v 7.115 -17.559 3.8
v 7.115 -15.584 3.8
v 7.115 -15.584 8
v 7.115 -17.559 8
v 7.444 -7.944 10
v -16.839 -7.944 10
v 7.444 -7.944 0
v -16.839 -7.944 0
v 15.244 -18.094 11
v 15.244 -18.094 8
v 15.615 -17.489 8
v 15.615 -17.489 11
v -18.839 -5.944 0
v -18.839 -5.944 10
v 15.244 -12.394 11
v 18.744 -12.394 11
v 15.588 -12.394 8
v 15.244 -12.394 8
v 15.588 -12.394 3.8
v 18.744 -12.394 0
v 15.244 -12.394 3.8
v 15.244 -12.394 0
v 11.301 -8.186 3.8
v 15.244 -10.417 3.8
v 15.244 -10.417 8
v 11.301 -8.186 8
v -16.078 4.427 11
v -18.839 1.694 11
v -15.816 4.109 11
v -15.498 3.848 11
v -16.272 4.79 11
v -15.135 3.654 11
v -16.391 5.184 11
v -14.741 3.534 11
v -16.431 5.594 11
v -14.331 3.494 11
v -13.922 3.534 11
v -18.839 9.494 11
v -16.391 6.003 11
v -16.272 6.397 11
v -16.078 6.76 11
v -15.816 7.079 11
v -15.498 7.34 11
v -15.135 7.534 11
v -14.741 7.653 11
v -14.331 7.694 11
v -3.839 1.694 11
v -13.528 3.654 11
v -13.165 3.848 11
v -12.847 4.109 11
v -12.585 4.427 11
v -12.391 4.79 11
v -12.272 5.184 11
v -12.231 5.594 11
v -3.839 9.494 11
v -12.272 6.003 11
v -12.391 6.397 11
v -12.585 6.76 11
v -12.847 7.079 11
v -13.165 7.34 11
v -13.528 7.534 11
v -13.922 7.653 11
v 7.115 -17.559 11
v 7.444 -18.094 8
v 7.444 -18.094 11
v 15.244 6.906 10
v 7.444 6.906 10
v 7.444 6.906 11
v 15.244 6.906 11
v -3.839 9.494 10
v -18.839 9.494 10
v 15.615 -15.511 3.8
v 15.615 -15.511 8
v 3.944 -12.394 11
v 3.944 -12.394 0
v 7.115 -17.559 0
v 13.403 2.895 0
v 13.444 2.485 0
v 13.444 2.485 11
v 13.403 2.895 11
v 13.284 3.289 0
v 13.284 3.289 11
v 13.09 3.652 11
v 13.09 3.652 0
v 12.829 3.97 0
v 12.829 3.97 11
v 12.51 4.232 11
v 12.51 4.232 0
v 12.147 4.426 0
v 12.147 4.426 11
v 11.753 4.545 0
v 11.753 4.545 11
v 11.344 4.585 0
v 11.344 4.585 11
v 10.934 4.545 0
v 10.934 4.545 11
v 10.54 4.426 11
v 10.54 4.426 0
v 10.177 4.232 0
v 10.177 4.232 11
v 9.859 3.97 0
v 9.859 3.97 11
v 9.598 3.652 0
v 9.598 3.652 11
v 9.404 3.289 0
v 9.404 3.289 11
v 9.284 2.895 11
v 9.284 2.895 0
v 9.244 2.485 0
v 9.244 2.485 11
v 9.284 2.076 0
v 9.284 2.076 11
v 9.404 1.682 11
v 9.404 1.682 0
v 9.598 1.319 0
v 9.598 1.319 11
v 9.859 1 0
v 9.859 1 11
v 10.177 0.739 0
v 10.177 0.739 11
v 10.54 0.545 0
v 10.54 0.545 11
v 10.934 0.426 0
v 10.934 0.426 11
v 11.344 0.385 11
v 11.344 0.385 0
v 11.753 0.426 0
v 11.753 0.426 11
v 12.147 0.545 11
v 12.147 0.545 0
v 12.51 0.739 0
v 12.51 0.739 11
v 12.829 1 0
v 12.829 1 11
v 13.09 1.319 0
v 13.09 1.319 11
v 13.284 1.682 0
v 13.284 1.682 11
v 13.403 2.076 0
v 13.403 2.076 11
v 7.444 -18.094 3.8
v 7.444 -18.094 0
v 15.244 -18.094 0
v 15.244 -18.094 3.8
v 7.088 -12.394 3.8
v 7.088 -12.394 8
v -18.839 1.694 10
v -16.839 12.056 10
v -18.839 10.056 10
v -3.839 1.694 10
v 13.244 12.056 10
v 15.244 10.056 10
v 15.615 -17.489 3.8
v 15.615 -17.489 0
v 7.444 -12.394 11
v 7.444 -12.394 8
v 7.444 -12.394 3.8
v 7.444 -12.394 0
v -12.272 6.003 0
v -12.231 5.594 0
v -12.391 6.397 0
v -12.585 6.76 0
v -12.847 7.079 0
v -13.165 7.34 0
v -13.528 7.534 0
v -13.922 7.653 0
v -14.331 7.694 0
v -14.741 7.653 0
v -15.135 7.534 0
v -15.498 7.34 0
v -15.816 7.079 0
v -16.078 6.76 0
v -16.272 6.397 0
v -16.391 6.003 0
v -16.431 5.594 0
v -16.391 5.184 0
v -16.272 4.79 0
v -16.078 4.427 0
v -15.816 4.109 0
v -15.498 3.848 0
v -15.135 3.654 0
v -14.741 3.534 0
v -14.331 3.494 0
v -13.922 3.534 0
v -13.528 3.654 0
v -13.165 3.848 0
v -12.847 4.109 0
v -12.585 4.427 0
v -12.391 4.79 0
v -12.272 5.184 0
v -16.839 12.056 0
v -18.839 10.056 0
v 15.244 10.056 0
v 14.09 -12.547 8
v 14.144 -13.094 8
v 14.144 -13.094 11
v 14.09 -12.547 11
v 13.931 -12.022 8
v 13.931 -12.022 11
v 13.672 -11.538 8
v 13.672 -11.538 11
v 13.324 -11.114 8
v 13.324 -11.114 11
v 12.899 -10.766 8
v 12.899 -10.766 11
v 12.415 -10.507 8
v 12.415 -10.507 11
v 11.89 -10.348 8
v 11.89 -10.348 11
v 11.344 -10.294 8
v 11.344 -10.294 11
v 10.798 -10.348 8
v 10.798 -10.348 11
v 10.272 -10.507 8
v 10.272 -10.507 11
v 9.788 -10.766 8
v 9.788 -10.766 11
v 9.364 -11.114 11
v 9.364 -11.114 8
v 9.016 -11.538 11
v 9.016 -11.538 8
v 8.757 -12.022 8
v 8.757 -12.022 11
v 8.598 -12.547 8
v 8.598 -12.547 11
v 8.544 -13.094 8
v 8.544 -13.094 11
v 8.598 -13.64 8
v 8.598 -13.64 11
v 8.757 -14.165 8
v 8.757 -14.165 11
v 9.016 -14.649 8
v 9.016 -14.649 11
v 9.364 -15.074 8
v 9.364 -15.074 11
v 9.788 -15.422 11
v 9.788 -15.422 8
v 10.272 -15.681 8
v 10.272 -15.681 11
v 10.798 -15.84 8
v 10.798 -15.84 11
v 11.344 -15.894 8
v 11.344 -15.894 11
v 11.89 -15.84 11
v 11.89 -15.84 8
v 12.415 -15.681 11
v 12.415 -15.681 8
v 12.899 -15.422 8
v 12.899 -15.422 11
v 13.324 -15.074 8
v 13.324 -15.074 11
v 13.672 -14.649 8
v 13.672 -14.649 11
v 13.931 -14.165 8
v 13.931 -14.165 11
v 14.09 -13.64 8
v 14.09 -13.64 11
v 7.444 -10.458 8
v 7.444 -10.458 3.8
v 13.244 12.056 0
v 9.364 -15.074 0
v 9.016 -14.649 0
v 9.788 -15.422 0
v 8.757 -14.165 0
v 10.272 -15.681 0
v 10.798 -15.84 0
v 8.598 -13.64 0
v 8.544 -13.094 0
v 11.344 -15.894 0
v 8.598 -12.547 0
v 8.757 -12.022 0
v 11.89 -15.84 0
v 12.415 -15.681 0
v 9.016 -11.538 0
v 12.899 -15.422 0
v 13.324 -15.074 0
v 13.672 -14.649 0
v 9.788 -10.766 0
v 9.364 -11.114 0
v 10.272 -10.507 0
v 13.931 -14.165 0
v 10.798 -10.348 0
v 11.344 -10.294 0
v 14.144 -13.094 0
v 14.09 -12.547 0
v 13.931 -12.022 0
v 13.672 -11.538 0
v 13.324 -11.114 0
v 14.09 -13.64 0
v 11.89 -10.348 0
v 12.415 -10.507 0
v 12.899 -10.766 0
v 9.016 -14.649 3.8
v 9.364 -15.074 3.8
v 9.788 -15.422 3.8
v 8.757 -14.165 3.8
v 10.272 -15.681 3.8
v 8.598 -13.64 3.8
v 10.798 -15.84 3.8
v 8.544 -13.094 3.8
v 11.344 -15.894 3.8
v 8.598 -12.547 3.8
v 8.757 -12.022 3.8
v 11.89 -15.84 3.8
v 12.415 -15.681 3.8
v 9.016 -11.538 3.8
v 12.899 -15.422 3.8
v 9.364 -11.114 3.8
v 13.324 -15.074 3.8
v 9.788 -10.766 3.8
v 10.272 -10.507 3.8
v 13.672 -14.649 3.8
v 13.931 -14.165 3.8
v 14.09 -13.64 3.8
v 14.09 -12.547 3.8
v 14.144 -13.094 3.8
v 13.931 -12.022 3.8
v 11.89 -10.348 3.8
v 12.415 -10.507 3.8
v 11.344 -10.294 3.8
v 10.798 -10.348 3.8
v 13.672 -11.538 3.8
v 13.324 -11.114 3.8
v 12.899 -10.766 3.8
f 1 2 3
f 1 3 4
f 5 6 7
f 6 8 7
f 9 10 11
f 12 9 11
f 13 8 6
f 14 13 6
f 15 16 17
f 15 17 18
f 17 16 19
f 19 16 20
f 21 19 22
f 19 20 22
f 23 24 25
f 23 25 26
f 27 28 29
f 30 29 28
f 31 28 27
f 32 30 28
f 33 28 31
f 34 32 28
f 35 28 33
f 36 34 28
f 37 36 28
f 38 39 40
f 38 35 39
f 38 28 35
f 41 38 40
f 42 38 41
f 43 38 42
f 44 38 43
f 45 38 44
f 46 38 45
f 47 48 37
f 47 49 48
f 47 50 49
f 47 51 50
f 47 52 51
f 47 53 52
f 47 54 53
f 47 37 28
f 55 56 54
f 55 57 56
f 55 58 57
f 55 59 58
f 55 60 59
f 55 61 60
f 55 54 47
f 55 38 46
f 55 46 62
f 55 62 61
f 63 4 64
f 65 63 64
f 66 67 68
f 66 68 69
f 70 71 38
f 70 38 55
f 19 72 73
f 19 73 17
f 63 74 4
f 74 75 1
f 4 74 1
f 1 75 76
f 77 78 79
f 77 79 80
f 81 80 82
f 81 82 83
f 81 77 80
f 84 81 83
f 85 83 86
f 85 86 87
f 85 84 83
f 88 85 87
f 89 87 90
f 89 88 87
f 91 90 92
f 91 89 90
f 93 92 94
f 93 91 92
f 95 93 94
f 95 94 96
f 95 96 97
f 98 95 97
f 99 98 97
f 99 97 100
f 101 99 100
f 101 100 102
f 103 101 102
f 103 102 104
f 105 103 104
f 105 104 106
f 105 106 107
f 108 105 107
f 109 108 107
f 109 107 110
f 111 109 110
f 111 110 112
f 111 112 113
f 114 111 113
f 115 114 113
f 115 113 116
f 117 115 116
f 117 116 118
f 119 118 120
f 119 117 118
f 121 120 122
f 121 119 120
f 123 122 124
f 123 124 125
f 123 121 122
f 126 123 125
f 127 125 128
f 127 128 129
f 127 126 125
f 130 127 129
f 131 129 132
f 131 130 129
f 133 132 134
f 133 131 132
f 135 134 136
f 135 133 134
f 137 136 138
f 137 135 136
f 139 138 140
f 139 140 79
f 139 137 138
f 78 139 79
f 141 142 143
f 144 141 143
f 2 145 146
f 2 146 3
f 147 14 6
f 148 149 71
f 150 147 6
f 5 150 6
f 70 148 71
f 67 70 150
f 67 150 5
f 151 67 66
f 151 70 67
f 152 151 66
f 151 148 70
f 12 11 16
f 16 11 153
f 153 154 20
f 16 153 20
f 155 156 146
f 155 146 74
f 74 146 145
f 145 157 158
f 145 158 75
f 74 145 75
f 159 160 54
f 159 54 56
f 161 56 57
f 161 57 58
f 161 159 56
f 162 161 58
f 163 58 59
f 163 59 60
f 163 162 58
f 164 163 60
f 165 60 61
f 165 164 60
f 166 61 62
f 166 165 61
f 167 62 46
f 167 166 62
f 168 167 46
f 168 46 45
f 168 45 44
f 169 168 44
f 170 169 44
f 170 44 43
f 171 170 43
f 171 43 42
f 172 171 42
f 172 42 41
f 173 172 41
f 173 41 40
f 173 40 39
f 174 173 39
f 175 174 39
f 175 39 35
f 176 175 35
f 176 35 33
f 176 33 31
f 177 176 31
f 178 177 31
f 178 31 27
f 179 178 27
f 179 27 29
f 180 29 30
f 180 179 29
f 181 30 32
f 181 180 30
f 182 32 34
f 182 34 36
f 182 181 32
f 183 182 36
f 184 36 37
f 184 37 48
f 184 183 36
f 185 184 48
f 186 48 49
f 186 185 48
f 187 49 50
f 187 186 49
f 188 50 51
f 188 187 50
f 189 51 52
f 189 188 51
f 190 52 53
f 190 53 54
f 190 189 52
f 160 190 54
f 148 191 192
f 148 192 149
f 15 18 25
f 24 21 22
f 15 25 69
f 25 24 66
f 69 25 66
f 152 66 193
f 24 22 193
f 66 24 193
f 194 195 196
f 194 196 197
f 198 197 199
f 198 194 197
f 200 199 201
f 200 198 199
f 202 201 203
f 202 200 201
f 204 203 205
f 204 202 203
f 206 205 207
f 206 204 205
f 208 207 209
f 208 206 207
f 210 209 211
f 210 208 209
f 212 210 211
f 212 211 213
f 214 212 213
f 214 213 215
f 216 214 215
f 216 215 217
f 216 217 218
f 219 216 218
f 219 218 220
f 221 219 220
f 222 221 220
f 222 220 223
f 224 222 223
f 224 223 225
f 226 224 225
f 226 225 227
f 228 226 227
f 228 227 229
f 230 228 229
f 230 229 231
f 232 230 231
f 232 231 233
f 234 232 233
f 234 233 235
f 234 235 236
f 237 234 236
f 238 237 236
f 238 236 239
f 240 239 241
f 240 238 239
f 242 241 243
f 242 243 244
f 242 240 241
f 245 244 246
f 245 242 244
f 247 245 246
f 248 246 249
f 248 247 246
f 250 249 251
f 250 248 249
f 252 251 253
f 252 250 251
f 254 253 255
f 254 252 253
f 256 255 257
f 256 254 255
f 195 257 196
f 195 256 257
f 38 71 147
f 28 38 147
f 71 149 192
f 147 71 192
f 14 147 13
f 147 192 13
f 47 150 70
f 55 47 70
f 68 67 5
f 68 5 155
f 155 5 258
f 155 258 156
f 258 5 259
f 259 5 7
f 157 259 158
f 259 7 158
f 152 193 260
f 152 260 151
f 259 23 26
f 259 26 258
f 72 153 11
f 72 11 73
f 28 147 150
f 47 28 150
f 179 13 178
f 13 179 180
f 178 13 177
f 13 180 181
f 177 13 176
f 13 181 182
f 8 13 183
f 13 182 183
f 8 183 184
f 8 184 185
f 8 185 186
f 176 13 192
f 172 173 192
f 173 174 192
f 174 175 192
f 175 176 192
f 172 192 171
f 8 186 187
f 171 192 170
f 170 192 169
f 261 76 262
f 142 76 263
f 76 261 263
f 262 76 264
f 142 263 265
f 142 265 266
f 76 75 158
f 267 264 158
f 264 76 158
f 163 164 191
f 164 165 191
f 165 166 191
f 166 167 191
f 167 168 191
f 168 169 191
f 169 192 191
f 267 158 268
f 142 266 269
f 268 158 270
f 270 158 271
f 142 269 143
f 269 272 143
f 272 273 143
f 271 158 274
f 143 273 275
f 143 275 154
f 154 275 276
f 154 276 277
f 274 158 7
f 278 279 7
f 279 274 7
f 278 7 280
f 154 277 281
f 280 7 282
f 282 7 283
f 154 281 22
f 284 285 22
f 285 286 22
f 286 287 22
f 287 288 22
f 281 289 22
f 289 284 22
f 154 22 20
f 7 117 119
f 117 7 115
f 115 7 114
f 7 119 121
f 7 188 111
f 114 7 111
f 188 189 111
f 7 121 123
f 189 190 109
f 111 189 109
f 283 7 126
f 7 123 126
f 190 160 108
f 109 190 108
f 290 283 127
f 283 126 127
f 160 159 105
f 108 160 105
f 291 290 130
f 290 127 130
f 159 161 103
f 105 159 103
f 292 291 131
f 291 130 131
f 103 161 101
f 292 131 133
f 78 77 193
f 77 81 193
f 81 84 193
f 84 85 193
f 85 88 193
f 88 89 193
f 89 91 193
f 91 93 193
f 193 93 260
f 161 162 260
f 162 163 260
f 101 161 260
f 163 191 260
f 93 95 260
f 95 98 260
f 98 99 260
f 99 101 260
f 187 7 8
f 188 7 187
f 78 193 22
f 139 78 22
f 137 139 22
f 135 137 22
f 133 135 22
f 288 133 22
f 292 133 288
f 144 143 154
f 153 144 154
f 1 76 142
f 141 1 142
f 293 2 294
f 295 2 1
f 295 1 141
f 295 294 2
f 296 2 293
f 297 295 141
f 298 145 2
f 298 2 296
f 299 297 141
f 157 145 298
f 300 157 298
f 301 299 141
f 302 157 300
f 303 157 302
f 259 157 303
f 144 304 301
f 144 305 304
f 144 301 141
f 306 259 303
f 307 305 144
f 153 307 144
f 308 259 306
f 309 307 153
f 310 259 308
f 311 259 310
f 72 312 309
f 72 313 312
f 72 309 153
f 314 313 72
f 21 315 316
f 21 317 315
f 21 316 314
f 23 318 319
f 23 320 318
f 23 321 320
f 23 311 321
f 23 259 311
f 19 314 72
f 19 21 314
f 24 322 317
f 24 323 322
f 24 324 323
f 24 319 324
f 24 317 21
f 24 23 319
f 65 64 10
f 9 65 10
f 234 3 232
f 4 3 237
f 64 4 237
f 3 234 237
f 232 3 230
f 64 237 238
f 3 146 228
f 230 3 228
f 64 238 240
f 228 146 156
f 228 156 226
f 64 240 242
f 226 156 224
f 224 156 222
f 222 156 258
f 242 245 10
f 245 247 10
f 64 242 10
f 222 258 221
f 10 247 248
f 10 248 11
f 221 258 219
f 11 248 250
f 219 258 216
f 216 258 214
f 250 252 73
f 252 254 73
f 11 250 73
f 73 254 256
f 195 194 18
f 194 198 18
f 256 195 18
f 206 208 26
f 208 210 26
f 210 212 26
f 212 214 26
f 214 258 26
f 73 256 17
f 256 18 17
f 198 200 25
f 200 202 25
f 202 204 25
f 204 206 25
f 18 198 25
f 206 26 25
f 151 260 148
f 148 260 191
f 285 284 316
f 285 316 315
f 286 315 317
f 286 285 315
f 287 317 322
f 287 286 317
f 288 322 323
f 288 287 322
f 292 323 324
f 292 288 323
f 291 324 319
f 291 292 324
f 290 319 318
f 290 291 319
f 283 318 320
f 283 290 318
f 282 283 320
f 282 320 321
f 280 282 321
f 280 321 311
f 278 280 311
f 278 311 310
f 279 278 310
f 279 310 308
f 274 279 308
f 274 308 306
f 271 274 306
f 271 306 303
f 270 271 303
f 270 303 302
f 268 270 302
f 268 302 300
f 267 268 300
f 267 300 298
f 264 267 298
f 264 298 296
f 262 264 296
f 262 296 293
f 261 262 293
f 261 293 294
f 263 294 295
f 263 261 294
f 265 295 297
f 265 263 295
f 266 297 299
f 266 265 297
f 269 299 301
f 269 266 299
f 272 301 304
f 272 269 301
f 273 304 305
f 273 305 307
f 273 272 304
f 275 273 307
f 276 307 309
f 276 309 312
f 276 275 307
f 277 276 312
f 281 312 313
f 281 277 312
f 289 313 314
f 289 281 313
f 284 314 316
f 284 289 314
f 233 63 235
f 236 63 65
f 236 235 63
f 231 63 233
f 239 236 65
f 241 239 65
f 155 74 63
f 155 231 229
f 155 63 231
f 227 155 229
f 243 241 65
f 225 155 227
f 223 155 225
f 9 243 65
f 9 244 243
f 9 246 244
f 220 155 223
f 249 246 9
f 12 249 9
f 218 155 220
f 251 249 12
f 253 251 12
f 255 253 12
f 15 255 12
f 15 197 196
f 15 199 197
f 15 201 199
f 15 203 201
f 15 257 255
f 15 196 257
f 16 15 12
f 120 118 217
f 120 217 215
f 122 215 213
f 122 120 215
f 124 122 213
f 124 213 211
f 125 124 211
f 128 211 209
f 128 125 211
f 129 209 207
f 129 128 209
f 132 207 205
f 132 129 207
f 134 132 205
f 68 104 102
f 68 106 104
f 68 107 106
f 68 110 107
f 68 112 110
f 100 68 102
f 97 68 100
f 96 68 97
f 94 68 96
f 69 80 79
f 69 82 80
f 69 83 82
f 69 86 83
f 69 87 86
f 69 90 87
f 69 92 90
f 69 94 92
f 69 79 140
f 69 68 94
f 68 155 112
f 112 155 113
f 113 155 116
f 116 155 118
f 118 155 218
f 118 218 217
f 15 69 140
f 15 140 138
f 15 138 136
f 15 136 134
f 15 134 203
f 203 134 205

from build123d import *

# Parameters (mm, degrees)
F0_W     = 15
F0_H     = 7.8
F0_R     = 2.1
F0_W_2   = 7.8
F0_H_2   = 14.85
F0_R_2   = 2.8
F1_DEPTH = 10
F2_START = 9
F2_DEPTH = 2
F3_START = 3.8
F3_DEPTH = 4.2
F4_SIZE  = 2


with BuildPart() as f1:
    # F0 (on Top) → F1 (new body)
    with BuildSketch(Plane.XY):
        Polygon((7.4437668294, -7.943718292), (7.4437668294, 6.906281708), (15.2437668294, 6.906281708), (15.2437668294, 12.056281708), (-18.8392331706, 12.056281708), (-18.8392331706, 9.493718292), (-3.8392331706, 9.493718292), (-3.8392331706, 1.693718292), (-18.8392331706, 1.693718292), (-18.8392331706, -7.943718292), align=None)
        Polygon((15.2437668294, -7.943718292), (7.4437668294, -7.943718292), (7.4437668294, -10.4582807188), (11.3013526795, -8.186424295), (15.2437668294, -10.4173709361), align=None)
        Polygon((7.115132639, -15.5840970217), (7.0875579305, -12.393718292), (3.9437668294, -12.393718292), (7.115132639, -17.5585140392), align=None)
        Polygon((7.4437668294, -18.093718292), (7.4437668294, -15.7700656479), (7.115132639, -15.5840970217), (7.115132639, -17.5585140392), align=None)
        Polygon((18.7437668294, -12.393718292), (15.5878754119, -12.393718292), (15.6148151695, -15.5106335593), (15.6148151695, -17.4894395666), align=None)
        Polygon((15.6148151695, -15.5106335593), (15.2437668294, -15.7291558652), (15.2437668294, -18.093718292), (15.6148151695, -17.4894395666), align=None)
        with Locations((-11.3392331706, 5.593718292)):
            Rectangle(F0_W, F0_H)
        with Locations((-14.3314907327, 5.593718292)):
            Circle(F0_R, mode=Mode.SUBTRACT)
        with Locations((11.3437668294, -0.518718292)):
            Rectangle(F0_W_2, F0_H_2)
        with Locations((11.3437668294, 2.4854193907)):
            Circle(F0_R, mode=Mode.SUBTRACT)
        Polygon((11.3861809792, -18.001012289), (7.4437668294, -15.7700656479), (7.4437668294, -18.093718292), (15.2437668294, -18.093718292), (15.2437668294, -15.7291558652), align=None)
        Polygon((7.4437668294, -15.7700656479), (7.4437668294, -12.393718292), (7.0875579305, -12.393718292), (7.115132639, -15.5840970217), align=None)
        Polygon((15.5878754119, -12.393718292), (15.2437668294, -12.393718292), (15.2437668294, -15.7291558652), (15.6148151695, -15.5106335593), align=None)
        Polygon((11.3013526795, -8.186424295), (7.4437668294, -10.4582807188), (7.4437668294, -12.393718292), (7.4437668294, -15.7700656479), (11.3861809792, -18.001012289), (15.2437668294, -15.7291558652), (15.2437668294, -12.393718292), (15.2437668294, -10.4173709361), align=None)
        with Locations((11.3437668294, -13.093718292)):
            Circle(F0_R_2, mode=Mode.SUBTRACT)
    extrude(amount=F1_DEPTH)

    # F0 (on Top) → F2 (join)
    with BuildSketch(Plane.XY.offset(F2_START)):
        with Locations((-11.3392331706, 5.593718292)):
            Rectangle(F0_W, F0_H)
        with Locations((-14.3314907327, 5.593718292)):
            Circle(F0_R, mode=Mode.SUBTRACT)
        with Locations((11.3437668294, -0.518718292)):
            Rectangle(F0_W_2, F0_H_2)
        with Locations((11.3437668294, 2.4854193907)):
            Circle(F0_R, mode=Mode.SUBTRACT)
        Polygon((7.4437668294, -15.7700656479), (7.4437668294, -12.393718292), (7.0875579305, -12.393718292), (7.115132639, -15.5840970217), align=None)
        Polygon((7.4437668294, -18.093718292), (7.4437668294, -15.7700656479), (7.115132639, -15.5840970217), (7.115132639, -17.5585140392), align=None)
        Polygon((11.3861809792, -18.001012289), (7.4437668294, -15.7700656479), (7.4437668294, -18.093718292), (15.2437668294, -18.093718292), (15.2437668294, -15.7291558652), align=None)
        Polygon((18.7437668294, -12.393718292), (15.5878754119, -12.393718292), (15.6148151695, -15.5106335593), (15.6148151695, -17.4894395666), align=None)
        Polygon((15.6148151695, -15.5106335593), (15.2437668294, -15.7291558652), (15.2437668294, -18.093718292), (15.6148151695, -17.4894395666), align=None)
        Polygon((7.115132639, -15.5840970217), (7.0875579305, -12.393718292), (3.9437668294, -12.393718292), (7.115132639, -17.5585140392), align=None)
        Polygon((11.3013526795, -8.186424295), (7.4437668294, -10.4582807188), (7.4437668294, -12.393718292), (7.4437668294, -15.7700656479), (11.3861809792, -18.001012289), (15.2437668294, -15.7291558652), (15.2437668294, -12.393718292), (15.2437668294, -10.4173709361), align=None)
        with Locations((11.3437668294, -13.093718292)):
            Circle(F0_R_2, mode=Mode.SUBTRACT)
        Polygon((15.2437668294, -7.943718292), (7.4437668294, -7.943718292), (7.4437668294, -10.4582807188), (11.3013526795, -8.186424295), (15.2437668294, -10.4173709361), align=None)
        Polygon((15.5878754119, -12.393718292), (15.2437668294, -12.393718292), (15.2437668294, -15.7291558652), (15.6148151695, -15.5106335593), align=None)
    extrude(amount=F2_DEPTH)

    # F0 (on Top) → F3 (cut)
    with BuildSketch(Plane.XY.offset(F3_START)):
        Polygon((15.5724010197, -10.6033395623), (15.2437668294, -10.4173709361), (15.2437668294, -12.393718292), (15.5878754119, -12.393718292), align=None)
        Polygon((11.3013526795, -8.186424295), (7.4437668294, -10.4582807188), (7.4437668294, -12.393718292), (7.4437668294, -15.7700656479), (11.3861809792, -18.001012289), (15.2437668294, -15.7291558652), (15.2437668294, -12.393718292), (15.2437668294, -10.4173709361), align=None)
        with Locations((11.3437668294, -13.093718292)):
            Circle(F0_R_2, mode=Mode.SUBTRACT)
        Polygon((15.5878754119, -12.393718292), (15.2437668294, -12.393718292), (15.2437668294, -15.7291558652), (15.6148151695, -15.5106335593), align=None)
        Polygon((7.4437668294, -15.7700656479), (7.4437668294, -12.393718292), (7.0875579305, -12.393718292), (7.115132639, -15.5840970217), align=None)
        Polygon((7.4437668294, -12.393718292), (7.4437668294, -10.4582807188), (7.0727184892, -10.6768030247), (7.0875579305, -12.393718292), align=None)
        Polygon((11.3861809792, -18.001012289), (7.4437668294, -15.7700656479), (7.4437668294, -18.093718292), (15.2437668294, -18.093718292), (15.2437668294, -15.7291558652), align=None)
        Polygon((15.6148151695, -15.5106335593), (15.2437668294, -15.7291558652), (15.2437668294, -18.093718292), (15.6148151695, -17.4894395666), align=None)
        Polygon((7.4437668294, -18.093718292), (7.4437668294, -15.7700656479), (7.115132639, -15.5840970217), (7.115132639, -17.5585140392), align=None)
    extrude(amount=F3_DEPTH, mode=Mode.SUBTRACT)

    # F4
    f4_edges = [f1.edges().sort_by_distance(p)[0] for p in [
        (15.243767, 12.056282, 5),
        (-18.839233, -7.943718, 5),
        (-18.839233, 12.056282, 5),
    ]]
    chamfer(f4_edges, length=F4_SIZE)


solid = f1.part
